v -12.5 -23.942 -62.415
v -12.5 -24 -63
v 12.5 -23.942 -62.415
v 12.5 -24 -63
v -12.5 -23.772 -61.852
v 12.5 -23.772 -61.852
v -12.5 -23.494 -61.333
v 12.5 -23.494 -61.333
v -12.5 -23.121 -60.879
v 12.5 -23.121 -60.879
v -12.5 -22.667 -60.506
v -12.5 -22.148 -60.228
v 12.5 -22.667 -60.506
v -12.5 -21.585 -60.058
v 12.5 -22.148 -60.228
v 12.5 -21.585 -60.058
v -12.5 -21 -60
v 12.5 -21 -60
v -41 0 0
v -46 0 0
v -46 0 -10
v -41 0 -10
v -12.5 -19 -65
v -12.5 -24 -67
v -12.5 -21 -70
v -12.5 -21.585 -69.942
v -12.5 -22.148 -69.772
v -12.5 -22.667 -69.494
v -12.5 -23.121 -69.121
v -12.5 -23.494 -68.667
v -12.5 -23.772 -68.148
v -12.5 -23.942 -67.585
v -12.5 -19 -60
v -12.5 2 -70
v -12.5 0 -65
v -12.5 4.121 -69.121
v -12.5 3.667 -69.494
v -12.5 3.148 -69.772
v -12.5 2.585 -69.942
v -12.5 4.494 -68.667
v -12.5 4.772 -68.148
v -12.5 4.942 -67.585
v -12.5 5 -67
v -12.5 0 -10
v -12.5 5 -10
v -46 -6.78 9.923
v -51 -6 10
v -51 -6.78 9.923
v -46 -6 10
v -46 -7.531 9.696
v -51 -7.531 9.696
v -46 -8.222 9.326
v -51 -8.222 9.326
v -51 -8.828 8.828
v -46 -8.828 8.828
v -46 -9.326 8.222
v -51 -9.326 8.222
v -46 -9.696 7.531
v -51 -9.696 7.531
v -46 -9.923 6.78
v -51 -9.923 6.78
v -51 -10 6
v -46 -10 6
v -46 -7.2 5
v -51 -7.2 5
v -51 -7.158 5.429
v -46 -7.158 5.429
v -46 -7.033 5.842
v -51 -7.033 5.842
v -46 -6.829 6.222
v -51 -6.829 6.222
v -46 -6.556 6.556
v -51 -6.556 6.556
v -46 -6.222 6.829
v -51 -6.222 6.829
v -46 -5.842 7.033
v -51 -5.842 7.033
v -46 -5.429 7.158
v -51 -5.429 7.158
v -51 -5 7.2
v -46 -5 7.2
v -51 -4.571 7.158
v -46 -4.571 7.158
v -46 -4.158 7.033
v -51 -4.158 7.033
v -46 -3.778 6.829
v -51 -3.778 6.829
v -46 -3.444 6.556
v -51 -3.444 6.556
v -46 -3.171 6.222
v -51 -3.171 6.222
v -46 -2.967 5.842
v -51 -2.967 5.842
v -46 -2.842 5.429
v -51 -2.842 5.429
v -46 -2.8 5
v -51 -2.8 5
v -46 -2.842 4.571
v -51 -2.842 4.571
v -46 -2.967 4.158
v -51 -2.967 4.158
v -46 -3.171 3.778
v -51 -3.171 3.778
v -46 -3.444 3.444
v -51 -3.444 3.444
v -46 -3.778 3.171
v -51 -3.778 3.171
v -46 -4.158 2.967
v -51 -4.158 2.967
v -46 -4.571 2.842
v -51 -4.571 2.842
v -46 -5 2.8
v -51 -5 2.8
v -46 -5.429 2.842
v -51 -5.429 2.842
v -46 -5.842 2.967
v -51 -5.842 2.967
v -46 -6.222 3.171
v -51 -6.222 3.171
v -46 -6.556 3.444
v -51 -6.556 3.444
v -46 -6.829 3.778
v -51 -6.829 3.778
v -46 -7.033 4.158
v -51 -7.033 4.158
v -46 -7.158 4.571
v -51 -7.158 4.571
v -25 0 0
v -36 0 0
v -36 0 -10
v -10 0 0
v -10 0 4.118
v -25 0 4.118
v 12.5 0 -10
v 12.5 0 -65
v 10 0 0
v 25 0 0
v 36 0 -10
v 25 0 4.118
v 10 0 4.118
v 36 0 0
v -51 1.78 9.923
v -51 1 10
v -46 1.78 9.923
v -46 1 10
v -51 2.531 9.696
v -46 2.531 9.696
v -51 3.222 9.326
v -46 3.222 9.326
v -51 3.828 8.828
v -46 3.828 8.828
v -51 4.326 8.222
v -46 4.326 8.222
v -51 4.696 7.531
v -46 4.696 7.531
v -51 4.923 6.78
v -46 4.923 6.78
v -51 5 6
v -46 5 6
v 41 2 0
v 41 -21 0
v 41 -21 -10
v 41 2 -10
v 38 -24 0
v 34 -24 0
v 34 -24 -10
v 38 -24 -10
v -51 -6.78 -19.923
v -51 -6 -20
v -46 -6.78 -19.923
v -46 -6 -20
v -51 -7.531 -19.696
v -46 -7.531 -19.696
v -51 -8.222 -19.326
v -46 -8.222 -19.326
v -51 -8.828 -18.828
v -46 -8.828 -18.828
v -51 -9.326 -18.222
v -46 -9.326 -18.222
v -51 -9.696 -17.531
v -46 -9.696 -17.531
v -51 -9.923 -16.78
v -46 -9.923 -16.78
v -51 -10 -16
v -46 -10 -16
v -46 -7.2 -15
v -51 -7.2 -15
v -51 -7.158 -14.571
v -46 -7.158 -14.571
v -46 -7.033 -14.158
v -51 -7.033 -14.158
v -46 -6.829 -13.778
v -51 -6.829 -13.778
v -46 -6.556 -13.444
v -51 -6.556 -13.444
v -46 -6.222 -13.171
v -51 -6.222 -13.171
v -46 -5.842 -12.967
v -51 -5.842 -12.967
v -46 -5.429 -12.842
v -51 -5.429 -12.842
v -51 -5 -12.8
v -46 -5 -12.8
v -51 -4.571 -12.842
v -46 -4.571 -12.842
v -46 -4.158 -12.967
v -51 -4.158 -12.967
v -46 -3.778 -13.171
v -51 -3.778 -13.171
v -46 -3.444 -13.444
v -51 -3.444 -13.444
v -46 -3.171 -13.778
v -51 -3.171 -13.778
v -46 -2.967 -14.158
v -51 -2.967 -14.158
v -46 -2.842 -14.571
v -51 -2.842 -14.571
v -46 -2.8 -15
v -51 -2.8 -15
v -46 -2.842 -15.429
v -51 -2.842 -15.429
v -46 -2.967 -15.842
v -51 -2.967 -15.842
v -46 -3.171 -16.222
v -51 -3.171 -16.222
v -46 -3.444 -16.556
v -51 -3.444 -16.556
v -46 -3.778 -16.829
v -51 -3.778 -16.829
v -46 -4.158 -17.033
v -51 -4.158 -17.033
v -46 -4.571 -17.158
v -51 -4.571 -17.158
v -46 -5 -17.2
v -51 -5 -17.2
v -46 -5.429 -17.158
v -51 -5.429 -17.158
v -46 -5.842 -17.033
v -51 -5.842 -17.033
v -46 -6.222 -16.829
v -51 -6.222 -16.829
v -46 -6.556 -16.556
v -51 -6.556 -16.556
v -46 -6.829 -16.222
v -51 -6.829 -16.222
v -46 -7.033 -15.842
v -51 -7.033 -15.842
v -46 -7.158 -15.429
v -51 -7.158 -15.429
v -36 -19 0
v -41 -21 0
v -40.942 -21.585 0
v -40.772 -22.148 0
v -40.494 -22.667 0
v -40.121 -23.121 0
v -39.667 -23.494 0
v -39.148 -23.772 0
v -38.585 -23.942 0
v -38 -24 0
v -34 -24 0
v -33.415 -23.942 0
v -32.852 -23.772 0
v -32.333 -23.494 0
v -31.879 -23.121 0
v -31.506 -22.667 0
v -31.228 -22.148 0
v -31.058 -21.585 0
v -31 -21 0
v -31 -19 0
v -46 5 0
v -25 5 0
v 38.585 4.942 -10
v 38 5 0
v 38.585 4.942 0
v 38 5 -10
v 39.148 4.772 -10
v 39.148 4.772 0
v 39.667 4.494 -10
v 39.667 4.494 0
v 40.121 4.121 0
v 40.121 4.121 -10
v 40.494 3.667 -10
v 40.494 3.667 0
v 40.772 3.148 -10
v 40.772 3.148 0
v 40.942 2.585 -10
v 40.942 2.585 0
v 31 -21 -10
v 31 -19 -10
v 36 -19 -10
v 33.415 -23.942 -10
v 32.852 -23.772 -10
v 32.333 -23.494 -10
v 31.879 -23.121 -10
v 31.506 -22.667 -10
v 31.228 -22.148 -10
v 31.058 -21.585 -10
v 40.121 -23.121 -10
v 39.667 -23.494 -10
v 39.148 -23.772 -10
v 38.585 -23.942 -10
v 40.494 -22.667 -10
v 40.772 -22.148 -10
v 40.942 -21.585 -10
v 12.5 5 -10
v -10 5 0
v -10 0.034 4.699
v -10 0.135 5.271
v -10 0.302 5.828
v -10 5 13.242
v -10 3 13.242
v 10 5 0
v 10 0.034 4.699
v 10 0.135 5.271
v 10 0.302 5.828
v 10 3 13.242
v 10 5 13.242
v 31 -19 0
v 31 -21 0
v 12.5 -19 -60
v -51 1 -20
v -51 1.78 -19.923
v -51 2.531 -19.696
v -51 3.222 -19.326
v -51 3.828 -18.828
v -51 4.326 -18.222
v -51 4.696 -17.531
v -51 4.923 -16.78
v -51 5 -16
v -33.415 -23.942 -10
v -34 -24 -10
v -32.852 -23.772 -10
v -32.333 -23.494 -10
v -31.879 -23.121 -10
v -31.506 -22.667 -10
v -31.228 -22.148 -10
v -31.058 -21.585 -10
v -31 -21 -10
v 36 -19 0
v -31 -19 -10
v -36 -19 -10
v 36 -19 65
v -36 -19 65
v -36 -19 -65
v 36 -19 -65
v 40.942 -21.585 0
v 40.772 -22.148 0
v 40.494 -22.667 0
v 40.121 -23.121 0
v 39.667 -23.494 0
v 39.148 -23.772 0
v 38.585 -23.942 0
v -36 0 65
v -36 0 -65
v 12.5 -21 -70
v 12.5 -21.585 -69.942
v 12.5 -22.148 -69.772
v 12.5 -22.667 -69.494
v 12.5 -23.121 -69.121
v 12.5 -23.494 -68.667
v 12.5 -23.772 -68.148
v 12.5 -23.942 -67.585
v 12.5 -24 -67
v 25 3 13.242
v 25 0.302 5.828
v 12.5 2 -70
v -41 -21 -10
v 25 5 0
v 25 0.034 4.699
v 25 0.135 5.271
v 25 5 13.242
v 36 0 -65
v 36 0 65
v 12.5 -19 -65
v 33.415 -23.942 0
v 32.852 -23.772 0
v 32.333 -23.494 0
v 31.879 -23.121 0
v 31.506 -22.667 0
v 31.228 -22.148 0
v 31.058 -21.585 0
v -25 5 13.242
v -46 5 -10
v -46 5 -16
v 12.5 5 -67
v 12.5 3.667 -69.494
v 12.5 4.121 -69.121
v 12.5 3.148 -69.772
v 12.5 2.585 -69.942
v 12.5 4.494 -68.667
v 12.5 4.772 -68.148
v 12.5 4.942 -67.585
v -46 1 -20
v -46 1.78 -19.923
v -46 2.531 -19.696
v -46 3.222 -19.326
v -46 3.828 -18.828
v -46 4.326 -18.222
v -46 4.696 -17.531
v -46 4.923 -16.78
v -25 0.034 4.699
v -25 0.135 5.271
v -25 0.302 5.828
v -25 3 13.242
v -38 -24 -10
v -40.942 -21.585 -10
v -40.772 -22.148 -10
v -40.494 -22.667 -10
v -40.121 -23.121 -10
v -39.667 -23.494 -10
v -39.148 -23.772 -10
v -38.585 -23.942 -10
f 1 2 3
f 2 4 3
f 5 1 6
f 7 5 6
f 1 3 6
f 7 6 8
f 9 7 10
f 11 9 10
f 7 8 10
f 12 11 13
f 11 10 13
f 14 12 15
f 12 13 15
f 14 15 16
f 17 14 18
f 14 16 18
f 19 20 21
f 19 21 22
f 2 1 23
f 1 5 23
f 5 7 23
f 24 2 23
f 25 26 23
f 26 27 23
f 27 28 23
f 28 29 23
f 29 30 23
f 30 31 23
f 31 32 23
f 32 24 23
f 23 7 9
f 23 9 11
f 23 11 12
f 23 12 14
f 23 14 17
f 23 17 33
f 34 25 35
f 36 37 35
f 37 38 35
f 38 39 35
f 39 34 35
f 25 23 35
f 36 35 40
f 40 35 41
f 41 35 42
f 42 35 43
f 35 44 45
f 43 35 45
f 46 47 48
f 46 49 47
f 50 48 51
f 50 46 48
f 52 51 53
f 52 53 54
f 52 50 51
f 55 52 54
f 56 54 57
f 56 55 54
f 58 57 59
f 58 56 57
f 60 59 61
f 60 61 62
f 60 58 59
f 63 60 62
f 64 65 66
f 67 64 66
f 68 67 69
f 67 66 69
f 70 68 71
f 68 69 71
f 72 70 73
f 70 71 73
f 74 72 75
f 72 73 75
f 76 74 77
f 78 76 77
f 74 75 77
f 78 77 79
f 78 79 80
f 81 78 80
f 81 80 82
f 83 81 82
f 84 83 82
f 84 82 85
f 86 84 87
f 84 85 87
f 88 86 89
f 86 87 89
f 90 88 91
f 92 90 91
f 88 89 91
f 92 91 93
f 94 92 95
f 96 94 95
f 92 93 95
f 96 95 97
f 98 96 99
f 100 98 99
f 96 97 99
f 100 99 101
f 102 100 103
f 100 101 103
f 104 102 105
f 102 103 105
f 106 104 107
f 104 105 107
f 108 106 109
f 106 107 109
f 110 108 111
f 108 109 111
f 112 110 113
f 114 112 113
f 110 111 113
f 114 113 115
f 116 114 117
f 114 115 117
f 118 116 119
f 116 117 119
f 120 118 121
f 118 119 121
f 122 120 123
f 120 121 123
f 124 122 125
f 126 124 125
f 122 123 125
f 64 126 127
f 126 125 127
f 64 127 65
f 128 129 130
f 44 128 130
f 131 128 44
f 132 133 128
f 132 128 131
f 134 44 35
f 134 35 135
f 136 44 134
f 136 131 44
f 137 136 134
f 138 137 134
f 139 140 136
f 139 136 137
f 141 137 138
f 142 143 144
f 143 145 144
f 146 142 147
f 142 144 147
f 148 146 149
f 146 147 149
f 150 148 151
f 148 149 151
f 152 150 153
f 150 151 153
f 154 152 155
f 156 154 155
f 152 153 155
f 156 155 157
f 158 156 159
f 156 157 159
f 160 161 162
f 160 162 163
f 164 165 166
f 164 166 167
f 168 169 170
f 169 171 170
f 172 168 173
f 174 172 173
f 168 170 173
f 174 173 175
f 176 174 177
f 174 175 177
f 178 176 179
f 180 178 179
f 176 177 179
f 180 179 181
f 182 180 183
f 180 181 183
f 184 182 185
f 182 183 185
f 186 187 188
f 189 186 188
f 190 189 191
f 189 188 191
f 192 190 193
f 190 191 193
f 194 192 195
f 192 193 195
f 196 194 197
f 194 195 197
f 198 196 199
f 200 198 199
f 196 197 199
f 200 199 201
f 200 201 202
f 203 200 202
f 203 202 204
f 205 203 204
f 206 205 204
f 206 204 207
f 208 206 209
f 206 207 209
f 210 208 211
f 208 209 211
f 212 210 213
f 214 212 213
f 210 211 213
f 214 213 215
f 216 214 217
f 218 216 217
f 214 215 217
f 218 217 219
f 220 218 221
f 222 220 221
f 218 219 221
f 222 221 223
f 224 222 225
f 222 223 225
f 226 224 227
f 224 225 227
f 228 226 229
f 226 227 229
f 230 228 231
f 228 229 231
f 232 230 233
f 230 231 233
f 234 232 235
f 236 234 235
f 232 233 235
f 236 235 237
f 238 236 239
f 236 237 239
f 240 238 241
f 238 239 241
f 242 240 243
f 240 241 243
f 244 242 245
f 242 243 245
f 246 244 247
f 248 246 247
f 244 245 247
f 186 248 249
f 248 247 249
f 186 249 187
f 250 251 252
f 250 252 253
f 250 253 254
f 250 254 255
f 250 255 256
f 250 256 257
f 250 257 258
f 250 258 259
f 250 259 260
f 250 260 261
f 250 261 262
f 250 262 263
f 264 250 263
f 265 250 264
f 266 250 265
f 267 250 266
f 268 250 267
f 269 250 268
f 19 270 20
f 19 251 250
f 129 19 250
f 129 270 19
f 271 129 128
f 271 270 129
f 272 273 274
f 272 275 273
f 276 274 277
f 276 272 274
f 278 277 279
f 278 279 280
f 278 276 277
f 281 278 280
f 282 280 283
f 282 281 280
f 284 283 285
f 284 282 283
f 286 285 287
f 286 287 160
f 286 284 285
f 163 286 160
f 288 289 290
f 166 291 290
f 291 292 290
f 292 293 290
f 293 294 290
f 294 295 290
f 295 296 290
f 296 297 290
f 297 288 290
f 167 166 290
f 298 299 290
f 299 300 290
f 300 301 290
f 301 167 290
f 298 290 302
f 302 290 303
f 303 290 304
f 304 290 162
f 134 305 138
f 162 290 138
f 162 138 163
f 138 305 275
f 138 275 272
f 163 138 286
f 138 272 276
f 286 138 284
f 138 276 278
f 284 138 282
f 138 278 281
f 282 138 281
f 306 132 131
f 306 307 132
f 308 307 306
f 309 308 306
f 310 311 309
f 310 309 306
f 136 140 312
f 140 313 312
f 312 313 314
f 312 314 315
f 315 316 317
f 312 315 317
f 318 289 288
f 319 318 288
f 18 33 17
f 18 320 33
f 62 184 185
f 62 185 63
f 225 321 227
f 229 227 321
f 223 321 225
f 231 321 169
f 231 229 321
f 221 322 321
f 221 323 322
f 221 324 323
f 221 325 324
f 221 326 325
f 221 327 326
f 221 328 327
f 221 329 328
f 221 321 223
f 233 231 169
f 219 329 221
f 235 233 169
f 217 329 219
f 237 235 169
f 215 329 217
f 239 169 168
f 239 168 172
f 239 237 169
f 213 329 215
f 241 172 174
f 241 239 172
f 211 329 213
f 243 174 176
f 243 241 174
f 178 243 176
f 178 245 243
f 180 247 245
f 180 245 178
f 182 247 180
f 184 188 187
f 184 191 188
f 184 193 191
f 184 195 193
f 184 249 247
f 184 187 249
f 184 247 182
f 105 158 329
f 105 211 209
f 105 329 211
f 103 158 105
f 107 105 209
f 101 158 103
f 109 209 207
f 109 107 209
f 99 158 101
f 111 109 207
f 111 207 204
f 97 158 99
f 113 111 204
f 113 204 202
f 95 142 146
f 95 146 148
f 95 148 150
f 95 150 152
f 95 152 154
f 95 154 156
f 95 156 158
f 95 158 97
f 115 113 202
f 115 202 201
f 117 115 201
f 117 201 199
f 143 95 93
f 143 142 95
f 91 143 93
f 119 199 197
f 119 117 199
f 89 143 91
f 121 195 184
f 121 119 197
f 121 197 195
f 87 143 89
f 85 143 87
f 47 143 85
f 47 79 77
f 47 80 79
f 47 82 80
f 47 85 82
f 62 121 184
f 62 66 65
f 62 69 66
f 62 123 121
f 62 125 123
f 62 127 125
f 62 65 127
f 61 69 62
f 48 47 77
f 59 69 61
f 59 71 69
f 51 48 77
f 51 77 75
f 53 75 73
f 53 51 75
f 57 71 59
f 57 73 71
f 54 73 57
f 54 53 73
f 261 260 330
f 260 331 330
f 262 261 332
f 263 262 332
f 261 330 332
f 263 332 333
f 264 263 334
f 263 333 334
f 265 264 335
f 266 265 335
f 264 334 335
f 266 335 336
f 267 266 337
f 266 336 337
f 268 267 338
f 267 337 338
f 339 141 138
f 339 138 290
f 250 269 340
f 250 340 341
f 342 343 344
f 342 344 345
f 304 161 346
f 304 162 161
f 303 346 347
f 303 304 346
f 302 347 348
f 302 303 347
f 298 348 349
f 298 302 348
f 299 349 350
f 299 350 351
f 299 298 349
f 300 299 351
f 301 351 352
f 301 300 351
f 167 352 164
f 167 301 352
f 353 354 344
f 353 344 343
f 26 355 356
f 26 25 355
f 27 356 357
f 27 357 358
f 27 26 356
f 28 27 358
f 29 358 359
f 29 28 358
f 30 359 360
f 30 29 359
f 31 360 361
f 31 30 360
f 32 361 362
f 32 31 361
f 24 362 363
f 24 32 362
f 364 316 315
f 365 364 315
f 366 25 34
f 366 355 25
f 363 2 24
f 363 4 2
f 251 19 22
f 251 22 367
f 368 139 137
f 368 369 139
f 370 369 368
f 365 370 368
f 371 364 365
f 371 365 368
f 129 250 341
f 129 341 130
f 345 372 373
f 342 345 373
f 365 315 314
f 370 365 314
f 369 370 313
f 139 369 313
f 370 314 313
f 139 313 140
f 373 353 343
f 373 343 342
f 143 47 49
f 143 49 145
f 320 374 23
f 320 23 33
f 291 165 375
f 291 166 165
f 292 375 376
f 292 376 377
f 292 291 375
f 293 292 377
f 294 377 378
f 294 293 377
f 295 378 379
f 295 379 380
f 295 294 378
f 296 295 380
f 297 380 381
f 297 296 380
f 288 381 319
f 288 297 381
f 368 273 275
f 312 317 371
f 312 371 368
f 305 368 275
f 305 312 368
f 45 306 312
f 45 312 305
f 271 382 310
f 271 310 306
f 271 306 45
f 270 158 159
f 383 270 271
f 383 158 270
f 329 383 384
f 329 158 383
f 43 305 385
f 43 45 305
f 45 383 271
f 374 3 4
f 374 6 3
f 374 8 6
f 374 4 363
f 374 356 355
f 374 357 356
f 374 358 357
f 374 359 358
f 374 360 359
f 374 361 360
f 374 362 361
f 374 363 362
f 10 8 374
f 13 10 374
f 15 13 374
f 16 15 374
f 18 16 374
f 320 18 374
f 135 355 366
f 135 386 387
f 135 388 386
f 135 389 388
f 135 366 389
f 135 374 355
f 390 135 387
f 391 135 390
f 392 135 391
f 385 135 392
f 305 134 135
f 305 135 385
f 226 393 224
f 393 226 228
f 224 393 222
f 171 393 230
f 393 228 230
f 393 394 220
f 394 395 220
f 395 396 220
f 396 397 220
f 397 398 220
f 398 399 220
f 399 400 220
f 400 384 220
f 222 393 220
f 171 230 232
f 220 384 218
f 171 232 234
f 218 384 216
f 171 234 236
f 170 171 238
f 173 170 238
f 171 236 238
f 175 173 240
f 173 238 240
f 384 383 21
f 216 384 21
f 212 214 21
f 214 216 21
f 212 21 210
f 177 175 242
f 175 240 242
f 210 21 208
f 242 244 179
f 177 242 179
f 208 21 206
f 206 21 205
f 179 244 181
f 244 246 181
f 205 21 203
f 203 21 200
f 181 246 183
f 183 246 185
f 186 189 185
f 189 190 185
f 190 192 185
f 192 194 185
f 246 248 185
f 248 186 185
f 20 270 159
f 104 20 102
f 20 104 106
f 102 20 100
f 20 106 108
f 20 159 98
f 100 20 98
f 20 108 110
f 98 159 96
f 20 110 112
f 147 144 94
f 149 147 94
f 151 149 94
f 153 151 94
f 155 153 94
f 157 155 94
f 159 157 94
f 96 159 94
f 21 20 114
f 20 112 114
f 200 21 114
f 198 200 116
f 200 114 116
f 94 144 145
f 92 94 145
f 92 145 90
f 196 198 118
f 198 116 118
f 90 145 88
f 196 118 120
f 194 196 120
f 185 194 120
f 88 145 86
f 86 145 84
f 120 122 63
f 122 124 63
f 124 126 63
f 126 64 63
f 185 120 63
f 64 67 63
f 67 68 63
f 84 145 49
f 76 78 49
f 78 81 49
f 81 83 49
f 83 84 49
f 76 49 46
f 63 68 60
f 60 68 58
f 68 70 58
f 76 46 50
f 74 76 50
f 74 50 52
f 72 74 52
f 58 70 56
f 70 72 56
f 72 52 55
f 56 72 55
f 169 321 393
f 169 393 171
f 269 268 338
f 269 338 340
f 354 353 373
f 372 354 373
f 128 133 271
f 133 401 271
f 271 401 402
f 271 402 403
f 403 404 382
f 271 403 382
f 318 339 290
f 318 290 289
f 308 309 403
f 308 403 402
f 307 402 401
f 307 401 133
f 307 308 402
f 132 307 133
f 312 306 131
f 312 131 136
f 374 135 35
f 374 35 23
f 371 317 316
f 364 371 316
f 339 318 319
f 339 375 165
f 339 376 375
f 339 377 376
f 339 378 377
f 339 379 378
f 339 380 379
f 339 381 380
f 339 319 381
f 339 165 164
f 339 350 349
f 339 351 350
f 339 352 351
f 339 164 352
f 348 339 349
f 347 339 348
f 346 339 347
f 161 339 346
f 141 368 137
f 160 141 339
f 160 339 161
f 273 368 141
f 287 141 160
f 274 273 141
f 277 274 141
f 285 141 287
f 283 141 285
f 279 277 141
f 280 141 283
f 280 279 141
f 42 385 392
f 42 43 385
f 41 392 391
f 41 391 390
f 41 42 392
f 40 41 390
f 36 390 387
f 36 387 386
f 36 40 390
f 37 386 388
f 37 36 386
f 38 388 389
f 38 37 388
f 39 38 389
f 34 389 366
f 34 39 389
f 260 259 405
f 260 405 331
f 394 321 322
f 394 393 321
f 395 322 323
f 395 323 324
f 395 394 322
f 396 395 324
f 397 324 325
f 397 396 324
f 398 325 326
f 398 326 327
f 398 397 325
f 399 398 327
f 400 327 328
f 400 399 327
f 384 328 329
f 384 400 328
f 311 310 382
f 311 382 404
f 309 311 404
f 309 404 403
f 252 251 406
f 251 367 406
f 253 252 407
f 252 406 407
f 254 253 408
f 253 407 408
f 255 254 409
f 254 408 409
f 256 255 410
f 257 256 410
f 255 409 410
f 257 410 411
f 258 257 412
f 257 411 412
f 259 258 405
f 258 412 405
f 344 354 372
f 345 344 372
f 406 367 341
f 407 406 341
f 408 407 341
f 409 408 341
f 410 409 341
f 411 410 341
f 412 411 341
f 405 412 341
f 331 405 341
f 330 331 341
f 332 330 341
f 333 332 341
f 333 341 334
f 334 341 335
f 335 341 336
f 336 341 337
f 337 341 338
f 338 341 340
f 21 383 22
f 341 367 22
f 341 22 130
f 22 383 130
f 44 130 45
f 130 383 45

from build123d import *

# Parameters (mm, degrees)
F0_W      = 72
F0_H      = 130
F1_DEPTH  = 19
F3_DEPTH  = 12.5
F4_R      = 3
F6_DEPTH  = 10
F7_R      = 3
F8_W      = 10
F8_H      = 5
F9_DEPTH  = 10
F10_R     = 2.2
F11_DEPTH = 5
F12_R     = 4
F14_START = 10
F14_DEPTH = 15


# Not quite as in the source:
# - a pattern or mirror of a feature is missing from the dataset's text; its kind, count and spacing are read off the source's solid


with BuildPart() as f1:
    # F0 (on Front) → F1 (new body)
    with BuildSketch(Plane.XZ):
        Rectangle(F0_W, F0_H)
    extrude(amount=F1_DEPTH)


with BuildPart() as f3:
    # F2 (on Right) → F3 (new body, symmetric)
    with BuildSketch(Plane.YZ):
        Polygon((5, 0), (0, 0), (0, -65), (-19, -65), (-19, -60), (-24, -60), (-24, -70), (5, -70), align=None)
    extrude(amount=F3_DEPTH, both=True)

    # F4
    f4_edges = [f3.edges().sort_by_distance(p)[0] for p in [
        (0, -24, -60),
        (0, -24, -70),
        (0, 5, -70),
    ]]
    fillet(f4_edges, radius=F4_R)

    # F5 (on Top) → F6 (join)
    with BuildSketch(Plane.XY):
        Polygon((12.5, 5), (12.5, 0), (36, 0), (36, -19), (31, -19), (31, -24), (41, -24), (41, 5), align=None)
        Polygon((-12.5, 0), (-12.5, 5), (-41, 5), (-41, -24), (-31, -24), (-31, -19), (-36, -19), (-36, 0), align=None)
    extrude(amount=-F6_DEPTH)

    # F7
    f7_edges = [f3.edges().sort_by_distance(p)[0] for p in [
        (31, -24, -5),
        (41, -24, -5),
        (41, 5, -5),
        (-41, -24, -5),
        (-31, -24, -5),
    ]]
    fillet(f7_edges, radius=F7_R)

    # F8 (on Top) → F9 (join, through all)
    with BuildSketch(Plane.XY):
        with Locations((-46, 2.5)):
            Rectangle(F8_W, F8_H)
    extrude(amount=-F9_DEPTH)

    # F10 (on face) → F11 (join)
    with BuildSketch(Plane(origin=(-51, 0, 0), x_dir=(0, -1, 0), z_dir=(-1, 0, 0))):
        Polygon((10, 10), (-5, 10), (-5, 0), (0, 0), (0, -10), (-5, -10), (-5, -20), (10, -20), align=None)
        with Locations((5, -15)):
            Circle(F10_R, mode=Mode.SUBTRACT)
        with Locations((5, 5)):
            Circle(F10_R, mode=Mode.SUBTRACT)
    extrude(amount=-F11_DEPTH)

    # F12
    f12_edges = [f3.edges().sort_by_distance(p)[0] for p in [
        (-48.5, -10, 10),
        (-48.5, -10, -20),
        (-48.5, 5, 10),
        (-48.5, 5, -20),
    ]]
    fillet(f12_edges, radius=F12_R)

    # F13 (on Right) → F14 (join)
    with BuildSketch(Plane.YZ.offset(F14_START)):
        with BuildLine():
            Line((0, 4.1183650965), (0, 0))
            Line((0, 0), (5, 0))
            Line((5, 0), (5, 13.2424322584))
            Line((5, 13.2424322584), (3, 13.2424322584))
            Line((3, 13.2424322584), (0.3015368961, 5.8284658131))
            ThreePointArc((0.3015368961, 5.8284658131), (0.0759612349, 4.9866059848), (0, 4.1183650965))
        make_face()
    f14 = extrude(amount=F14_DEPTH)

    # F14_copies: F14 across plane
    add(f14.mirror(Plane(origin=(0, 0, 0), x_dir=(0, 0, -1), z_dir=(-1, 0, 0))))


solid = Compound([f1.part, f3.part])
